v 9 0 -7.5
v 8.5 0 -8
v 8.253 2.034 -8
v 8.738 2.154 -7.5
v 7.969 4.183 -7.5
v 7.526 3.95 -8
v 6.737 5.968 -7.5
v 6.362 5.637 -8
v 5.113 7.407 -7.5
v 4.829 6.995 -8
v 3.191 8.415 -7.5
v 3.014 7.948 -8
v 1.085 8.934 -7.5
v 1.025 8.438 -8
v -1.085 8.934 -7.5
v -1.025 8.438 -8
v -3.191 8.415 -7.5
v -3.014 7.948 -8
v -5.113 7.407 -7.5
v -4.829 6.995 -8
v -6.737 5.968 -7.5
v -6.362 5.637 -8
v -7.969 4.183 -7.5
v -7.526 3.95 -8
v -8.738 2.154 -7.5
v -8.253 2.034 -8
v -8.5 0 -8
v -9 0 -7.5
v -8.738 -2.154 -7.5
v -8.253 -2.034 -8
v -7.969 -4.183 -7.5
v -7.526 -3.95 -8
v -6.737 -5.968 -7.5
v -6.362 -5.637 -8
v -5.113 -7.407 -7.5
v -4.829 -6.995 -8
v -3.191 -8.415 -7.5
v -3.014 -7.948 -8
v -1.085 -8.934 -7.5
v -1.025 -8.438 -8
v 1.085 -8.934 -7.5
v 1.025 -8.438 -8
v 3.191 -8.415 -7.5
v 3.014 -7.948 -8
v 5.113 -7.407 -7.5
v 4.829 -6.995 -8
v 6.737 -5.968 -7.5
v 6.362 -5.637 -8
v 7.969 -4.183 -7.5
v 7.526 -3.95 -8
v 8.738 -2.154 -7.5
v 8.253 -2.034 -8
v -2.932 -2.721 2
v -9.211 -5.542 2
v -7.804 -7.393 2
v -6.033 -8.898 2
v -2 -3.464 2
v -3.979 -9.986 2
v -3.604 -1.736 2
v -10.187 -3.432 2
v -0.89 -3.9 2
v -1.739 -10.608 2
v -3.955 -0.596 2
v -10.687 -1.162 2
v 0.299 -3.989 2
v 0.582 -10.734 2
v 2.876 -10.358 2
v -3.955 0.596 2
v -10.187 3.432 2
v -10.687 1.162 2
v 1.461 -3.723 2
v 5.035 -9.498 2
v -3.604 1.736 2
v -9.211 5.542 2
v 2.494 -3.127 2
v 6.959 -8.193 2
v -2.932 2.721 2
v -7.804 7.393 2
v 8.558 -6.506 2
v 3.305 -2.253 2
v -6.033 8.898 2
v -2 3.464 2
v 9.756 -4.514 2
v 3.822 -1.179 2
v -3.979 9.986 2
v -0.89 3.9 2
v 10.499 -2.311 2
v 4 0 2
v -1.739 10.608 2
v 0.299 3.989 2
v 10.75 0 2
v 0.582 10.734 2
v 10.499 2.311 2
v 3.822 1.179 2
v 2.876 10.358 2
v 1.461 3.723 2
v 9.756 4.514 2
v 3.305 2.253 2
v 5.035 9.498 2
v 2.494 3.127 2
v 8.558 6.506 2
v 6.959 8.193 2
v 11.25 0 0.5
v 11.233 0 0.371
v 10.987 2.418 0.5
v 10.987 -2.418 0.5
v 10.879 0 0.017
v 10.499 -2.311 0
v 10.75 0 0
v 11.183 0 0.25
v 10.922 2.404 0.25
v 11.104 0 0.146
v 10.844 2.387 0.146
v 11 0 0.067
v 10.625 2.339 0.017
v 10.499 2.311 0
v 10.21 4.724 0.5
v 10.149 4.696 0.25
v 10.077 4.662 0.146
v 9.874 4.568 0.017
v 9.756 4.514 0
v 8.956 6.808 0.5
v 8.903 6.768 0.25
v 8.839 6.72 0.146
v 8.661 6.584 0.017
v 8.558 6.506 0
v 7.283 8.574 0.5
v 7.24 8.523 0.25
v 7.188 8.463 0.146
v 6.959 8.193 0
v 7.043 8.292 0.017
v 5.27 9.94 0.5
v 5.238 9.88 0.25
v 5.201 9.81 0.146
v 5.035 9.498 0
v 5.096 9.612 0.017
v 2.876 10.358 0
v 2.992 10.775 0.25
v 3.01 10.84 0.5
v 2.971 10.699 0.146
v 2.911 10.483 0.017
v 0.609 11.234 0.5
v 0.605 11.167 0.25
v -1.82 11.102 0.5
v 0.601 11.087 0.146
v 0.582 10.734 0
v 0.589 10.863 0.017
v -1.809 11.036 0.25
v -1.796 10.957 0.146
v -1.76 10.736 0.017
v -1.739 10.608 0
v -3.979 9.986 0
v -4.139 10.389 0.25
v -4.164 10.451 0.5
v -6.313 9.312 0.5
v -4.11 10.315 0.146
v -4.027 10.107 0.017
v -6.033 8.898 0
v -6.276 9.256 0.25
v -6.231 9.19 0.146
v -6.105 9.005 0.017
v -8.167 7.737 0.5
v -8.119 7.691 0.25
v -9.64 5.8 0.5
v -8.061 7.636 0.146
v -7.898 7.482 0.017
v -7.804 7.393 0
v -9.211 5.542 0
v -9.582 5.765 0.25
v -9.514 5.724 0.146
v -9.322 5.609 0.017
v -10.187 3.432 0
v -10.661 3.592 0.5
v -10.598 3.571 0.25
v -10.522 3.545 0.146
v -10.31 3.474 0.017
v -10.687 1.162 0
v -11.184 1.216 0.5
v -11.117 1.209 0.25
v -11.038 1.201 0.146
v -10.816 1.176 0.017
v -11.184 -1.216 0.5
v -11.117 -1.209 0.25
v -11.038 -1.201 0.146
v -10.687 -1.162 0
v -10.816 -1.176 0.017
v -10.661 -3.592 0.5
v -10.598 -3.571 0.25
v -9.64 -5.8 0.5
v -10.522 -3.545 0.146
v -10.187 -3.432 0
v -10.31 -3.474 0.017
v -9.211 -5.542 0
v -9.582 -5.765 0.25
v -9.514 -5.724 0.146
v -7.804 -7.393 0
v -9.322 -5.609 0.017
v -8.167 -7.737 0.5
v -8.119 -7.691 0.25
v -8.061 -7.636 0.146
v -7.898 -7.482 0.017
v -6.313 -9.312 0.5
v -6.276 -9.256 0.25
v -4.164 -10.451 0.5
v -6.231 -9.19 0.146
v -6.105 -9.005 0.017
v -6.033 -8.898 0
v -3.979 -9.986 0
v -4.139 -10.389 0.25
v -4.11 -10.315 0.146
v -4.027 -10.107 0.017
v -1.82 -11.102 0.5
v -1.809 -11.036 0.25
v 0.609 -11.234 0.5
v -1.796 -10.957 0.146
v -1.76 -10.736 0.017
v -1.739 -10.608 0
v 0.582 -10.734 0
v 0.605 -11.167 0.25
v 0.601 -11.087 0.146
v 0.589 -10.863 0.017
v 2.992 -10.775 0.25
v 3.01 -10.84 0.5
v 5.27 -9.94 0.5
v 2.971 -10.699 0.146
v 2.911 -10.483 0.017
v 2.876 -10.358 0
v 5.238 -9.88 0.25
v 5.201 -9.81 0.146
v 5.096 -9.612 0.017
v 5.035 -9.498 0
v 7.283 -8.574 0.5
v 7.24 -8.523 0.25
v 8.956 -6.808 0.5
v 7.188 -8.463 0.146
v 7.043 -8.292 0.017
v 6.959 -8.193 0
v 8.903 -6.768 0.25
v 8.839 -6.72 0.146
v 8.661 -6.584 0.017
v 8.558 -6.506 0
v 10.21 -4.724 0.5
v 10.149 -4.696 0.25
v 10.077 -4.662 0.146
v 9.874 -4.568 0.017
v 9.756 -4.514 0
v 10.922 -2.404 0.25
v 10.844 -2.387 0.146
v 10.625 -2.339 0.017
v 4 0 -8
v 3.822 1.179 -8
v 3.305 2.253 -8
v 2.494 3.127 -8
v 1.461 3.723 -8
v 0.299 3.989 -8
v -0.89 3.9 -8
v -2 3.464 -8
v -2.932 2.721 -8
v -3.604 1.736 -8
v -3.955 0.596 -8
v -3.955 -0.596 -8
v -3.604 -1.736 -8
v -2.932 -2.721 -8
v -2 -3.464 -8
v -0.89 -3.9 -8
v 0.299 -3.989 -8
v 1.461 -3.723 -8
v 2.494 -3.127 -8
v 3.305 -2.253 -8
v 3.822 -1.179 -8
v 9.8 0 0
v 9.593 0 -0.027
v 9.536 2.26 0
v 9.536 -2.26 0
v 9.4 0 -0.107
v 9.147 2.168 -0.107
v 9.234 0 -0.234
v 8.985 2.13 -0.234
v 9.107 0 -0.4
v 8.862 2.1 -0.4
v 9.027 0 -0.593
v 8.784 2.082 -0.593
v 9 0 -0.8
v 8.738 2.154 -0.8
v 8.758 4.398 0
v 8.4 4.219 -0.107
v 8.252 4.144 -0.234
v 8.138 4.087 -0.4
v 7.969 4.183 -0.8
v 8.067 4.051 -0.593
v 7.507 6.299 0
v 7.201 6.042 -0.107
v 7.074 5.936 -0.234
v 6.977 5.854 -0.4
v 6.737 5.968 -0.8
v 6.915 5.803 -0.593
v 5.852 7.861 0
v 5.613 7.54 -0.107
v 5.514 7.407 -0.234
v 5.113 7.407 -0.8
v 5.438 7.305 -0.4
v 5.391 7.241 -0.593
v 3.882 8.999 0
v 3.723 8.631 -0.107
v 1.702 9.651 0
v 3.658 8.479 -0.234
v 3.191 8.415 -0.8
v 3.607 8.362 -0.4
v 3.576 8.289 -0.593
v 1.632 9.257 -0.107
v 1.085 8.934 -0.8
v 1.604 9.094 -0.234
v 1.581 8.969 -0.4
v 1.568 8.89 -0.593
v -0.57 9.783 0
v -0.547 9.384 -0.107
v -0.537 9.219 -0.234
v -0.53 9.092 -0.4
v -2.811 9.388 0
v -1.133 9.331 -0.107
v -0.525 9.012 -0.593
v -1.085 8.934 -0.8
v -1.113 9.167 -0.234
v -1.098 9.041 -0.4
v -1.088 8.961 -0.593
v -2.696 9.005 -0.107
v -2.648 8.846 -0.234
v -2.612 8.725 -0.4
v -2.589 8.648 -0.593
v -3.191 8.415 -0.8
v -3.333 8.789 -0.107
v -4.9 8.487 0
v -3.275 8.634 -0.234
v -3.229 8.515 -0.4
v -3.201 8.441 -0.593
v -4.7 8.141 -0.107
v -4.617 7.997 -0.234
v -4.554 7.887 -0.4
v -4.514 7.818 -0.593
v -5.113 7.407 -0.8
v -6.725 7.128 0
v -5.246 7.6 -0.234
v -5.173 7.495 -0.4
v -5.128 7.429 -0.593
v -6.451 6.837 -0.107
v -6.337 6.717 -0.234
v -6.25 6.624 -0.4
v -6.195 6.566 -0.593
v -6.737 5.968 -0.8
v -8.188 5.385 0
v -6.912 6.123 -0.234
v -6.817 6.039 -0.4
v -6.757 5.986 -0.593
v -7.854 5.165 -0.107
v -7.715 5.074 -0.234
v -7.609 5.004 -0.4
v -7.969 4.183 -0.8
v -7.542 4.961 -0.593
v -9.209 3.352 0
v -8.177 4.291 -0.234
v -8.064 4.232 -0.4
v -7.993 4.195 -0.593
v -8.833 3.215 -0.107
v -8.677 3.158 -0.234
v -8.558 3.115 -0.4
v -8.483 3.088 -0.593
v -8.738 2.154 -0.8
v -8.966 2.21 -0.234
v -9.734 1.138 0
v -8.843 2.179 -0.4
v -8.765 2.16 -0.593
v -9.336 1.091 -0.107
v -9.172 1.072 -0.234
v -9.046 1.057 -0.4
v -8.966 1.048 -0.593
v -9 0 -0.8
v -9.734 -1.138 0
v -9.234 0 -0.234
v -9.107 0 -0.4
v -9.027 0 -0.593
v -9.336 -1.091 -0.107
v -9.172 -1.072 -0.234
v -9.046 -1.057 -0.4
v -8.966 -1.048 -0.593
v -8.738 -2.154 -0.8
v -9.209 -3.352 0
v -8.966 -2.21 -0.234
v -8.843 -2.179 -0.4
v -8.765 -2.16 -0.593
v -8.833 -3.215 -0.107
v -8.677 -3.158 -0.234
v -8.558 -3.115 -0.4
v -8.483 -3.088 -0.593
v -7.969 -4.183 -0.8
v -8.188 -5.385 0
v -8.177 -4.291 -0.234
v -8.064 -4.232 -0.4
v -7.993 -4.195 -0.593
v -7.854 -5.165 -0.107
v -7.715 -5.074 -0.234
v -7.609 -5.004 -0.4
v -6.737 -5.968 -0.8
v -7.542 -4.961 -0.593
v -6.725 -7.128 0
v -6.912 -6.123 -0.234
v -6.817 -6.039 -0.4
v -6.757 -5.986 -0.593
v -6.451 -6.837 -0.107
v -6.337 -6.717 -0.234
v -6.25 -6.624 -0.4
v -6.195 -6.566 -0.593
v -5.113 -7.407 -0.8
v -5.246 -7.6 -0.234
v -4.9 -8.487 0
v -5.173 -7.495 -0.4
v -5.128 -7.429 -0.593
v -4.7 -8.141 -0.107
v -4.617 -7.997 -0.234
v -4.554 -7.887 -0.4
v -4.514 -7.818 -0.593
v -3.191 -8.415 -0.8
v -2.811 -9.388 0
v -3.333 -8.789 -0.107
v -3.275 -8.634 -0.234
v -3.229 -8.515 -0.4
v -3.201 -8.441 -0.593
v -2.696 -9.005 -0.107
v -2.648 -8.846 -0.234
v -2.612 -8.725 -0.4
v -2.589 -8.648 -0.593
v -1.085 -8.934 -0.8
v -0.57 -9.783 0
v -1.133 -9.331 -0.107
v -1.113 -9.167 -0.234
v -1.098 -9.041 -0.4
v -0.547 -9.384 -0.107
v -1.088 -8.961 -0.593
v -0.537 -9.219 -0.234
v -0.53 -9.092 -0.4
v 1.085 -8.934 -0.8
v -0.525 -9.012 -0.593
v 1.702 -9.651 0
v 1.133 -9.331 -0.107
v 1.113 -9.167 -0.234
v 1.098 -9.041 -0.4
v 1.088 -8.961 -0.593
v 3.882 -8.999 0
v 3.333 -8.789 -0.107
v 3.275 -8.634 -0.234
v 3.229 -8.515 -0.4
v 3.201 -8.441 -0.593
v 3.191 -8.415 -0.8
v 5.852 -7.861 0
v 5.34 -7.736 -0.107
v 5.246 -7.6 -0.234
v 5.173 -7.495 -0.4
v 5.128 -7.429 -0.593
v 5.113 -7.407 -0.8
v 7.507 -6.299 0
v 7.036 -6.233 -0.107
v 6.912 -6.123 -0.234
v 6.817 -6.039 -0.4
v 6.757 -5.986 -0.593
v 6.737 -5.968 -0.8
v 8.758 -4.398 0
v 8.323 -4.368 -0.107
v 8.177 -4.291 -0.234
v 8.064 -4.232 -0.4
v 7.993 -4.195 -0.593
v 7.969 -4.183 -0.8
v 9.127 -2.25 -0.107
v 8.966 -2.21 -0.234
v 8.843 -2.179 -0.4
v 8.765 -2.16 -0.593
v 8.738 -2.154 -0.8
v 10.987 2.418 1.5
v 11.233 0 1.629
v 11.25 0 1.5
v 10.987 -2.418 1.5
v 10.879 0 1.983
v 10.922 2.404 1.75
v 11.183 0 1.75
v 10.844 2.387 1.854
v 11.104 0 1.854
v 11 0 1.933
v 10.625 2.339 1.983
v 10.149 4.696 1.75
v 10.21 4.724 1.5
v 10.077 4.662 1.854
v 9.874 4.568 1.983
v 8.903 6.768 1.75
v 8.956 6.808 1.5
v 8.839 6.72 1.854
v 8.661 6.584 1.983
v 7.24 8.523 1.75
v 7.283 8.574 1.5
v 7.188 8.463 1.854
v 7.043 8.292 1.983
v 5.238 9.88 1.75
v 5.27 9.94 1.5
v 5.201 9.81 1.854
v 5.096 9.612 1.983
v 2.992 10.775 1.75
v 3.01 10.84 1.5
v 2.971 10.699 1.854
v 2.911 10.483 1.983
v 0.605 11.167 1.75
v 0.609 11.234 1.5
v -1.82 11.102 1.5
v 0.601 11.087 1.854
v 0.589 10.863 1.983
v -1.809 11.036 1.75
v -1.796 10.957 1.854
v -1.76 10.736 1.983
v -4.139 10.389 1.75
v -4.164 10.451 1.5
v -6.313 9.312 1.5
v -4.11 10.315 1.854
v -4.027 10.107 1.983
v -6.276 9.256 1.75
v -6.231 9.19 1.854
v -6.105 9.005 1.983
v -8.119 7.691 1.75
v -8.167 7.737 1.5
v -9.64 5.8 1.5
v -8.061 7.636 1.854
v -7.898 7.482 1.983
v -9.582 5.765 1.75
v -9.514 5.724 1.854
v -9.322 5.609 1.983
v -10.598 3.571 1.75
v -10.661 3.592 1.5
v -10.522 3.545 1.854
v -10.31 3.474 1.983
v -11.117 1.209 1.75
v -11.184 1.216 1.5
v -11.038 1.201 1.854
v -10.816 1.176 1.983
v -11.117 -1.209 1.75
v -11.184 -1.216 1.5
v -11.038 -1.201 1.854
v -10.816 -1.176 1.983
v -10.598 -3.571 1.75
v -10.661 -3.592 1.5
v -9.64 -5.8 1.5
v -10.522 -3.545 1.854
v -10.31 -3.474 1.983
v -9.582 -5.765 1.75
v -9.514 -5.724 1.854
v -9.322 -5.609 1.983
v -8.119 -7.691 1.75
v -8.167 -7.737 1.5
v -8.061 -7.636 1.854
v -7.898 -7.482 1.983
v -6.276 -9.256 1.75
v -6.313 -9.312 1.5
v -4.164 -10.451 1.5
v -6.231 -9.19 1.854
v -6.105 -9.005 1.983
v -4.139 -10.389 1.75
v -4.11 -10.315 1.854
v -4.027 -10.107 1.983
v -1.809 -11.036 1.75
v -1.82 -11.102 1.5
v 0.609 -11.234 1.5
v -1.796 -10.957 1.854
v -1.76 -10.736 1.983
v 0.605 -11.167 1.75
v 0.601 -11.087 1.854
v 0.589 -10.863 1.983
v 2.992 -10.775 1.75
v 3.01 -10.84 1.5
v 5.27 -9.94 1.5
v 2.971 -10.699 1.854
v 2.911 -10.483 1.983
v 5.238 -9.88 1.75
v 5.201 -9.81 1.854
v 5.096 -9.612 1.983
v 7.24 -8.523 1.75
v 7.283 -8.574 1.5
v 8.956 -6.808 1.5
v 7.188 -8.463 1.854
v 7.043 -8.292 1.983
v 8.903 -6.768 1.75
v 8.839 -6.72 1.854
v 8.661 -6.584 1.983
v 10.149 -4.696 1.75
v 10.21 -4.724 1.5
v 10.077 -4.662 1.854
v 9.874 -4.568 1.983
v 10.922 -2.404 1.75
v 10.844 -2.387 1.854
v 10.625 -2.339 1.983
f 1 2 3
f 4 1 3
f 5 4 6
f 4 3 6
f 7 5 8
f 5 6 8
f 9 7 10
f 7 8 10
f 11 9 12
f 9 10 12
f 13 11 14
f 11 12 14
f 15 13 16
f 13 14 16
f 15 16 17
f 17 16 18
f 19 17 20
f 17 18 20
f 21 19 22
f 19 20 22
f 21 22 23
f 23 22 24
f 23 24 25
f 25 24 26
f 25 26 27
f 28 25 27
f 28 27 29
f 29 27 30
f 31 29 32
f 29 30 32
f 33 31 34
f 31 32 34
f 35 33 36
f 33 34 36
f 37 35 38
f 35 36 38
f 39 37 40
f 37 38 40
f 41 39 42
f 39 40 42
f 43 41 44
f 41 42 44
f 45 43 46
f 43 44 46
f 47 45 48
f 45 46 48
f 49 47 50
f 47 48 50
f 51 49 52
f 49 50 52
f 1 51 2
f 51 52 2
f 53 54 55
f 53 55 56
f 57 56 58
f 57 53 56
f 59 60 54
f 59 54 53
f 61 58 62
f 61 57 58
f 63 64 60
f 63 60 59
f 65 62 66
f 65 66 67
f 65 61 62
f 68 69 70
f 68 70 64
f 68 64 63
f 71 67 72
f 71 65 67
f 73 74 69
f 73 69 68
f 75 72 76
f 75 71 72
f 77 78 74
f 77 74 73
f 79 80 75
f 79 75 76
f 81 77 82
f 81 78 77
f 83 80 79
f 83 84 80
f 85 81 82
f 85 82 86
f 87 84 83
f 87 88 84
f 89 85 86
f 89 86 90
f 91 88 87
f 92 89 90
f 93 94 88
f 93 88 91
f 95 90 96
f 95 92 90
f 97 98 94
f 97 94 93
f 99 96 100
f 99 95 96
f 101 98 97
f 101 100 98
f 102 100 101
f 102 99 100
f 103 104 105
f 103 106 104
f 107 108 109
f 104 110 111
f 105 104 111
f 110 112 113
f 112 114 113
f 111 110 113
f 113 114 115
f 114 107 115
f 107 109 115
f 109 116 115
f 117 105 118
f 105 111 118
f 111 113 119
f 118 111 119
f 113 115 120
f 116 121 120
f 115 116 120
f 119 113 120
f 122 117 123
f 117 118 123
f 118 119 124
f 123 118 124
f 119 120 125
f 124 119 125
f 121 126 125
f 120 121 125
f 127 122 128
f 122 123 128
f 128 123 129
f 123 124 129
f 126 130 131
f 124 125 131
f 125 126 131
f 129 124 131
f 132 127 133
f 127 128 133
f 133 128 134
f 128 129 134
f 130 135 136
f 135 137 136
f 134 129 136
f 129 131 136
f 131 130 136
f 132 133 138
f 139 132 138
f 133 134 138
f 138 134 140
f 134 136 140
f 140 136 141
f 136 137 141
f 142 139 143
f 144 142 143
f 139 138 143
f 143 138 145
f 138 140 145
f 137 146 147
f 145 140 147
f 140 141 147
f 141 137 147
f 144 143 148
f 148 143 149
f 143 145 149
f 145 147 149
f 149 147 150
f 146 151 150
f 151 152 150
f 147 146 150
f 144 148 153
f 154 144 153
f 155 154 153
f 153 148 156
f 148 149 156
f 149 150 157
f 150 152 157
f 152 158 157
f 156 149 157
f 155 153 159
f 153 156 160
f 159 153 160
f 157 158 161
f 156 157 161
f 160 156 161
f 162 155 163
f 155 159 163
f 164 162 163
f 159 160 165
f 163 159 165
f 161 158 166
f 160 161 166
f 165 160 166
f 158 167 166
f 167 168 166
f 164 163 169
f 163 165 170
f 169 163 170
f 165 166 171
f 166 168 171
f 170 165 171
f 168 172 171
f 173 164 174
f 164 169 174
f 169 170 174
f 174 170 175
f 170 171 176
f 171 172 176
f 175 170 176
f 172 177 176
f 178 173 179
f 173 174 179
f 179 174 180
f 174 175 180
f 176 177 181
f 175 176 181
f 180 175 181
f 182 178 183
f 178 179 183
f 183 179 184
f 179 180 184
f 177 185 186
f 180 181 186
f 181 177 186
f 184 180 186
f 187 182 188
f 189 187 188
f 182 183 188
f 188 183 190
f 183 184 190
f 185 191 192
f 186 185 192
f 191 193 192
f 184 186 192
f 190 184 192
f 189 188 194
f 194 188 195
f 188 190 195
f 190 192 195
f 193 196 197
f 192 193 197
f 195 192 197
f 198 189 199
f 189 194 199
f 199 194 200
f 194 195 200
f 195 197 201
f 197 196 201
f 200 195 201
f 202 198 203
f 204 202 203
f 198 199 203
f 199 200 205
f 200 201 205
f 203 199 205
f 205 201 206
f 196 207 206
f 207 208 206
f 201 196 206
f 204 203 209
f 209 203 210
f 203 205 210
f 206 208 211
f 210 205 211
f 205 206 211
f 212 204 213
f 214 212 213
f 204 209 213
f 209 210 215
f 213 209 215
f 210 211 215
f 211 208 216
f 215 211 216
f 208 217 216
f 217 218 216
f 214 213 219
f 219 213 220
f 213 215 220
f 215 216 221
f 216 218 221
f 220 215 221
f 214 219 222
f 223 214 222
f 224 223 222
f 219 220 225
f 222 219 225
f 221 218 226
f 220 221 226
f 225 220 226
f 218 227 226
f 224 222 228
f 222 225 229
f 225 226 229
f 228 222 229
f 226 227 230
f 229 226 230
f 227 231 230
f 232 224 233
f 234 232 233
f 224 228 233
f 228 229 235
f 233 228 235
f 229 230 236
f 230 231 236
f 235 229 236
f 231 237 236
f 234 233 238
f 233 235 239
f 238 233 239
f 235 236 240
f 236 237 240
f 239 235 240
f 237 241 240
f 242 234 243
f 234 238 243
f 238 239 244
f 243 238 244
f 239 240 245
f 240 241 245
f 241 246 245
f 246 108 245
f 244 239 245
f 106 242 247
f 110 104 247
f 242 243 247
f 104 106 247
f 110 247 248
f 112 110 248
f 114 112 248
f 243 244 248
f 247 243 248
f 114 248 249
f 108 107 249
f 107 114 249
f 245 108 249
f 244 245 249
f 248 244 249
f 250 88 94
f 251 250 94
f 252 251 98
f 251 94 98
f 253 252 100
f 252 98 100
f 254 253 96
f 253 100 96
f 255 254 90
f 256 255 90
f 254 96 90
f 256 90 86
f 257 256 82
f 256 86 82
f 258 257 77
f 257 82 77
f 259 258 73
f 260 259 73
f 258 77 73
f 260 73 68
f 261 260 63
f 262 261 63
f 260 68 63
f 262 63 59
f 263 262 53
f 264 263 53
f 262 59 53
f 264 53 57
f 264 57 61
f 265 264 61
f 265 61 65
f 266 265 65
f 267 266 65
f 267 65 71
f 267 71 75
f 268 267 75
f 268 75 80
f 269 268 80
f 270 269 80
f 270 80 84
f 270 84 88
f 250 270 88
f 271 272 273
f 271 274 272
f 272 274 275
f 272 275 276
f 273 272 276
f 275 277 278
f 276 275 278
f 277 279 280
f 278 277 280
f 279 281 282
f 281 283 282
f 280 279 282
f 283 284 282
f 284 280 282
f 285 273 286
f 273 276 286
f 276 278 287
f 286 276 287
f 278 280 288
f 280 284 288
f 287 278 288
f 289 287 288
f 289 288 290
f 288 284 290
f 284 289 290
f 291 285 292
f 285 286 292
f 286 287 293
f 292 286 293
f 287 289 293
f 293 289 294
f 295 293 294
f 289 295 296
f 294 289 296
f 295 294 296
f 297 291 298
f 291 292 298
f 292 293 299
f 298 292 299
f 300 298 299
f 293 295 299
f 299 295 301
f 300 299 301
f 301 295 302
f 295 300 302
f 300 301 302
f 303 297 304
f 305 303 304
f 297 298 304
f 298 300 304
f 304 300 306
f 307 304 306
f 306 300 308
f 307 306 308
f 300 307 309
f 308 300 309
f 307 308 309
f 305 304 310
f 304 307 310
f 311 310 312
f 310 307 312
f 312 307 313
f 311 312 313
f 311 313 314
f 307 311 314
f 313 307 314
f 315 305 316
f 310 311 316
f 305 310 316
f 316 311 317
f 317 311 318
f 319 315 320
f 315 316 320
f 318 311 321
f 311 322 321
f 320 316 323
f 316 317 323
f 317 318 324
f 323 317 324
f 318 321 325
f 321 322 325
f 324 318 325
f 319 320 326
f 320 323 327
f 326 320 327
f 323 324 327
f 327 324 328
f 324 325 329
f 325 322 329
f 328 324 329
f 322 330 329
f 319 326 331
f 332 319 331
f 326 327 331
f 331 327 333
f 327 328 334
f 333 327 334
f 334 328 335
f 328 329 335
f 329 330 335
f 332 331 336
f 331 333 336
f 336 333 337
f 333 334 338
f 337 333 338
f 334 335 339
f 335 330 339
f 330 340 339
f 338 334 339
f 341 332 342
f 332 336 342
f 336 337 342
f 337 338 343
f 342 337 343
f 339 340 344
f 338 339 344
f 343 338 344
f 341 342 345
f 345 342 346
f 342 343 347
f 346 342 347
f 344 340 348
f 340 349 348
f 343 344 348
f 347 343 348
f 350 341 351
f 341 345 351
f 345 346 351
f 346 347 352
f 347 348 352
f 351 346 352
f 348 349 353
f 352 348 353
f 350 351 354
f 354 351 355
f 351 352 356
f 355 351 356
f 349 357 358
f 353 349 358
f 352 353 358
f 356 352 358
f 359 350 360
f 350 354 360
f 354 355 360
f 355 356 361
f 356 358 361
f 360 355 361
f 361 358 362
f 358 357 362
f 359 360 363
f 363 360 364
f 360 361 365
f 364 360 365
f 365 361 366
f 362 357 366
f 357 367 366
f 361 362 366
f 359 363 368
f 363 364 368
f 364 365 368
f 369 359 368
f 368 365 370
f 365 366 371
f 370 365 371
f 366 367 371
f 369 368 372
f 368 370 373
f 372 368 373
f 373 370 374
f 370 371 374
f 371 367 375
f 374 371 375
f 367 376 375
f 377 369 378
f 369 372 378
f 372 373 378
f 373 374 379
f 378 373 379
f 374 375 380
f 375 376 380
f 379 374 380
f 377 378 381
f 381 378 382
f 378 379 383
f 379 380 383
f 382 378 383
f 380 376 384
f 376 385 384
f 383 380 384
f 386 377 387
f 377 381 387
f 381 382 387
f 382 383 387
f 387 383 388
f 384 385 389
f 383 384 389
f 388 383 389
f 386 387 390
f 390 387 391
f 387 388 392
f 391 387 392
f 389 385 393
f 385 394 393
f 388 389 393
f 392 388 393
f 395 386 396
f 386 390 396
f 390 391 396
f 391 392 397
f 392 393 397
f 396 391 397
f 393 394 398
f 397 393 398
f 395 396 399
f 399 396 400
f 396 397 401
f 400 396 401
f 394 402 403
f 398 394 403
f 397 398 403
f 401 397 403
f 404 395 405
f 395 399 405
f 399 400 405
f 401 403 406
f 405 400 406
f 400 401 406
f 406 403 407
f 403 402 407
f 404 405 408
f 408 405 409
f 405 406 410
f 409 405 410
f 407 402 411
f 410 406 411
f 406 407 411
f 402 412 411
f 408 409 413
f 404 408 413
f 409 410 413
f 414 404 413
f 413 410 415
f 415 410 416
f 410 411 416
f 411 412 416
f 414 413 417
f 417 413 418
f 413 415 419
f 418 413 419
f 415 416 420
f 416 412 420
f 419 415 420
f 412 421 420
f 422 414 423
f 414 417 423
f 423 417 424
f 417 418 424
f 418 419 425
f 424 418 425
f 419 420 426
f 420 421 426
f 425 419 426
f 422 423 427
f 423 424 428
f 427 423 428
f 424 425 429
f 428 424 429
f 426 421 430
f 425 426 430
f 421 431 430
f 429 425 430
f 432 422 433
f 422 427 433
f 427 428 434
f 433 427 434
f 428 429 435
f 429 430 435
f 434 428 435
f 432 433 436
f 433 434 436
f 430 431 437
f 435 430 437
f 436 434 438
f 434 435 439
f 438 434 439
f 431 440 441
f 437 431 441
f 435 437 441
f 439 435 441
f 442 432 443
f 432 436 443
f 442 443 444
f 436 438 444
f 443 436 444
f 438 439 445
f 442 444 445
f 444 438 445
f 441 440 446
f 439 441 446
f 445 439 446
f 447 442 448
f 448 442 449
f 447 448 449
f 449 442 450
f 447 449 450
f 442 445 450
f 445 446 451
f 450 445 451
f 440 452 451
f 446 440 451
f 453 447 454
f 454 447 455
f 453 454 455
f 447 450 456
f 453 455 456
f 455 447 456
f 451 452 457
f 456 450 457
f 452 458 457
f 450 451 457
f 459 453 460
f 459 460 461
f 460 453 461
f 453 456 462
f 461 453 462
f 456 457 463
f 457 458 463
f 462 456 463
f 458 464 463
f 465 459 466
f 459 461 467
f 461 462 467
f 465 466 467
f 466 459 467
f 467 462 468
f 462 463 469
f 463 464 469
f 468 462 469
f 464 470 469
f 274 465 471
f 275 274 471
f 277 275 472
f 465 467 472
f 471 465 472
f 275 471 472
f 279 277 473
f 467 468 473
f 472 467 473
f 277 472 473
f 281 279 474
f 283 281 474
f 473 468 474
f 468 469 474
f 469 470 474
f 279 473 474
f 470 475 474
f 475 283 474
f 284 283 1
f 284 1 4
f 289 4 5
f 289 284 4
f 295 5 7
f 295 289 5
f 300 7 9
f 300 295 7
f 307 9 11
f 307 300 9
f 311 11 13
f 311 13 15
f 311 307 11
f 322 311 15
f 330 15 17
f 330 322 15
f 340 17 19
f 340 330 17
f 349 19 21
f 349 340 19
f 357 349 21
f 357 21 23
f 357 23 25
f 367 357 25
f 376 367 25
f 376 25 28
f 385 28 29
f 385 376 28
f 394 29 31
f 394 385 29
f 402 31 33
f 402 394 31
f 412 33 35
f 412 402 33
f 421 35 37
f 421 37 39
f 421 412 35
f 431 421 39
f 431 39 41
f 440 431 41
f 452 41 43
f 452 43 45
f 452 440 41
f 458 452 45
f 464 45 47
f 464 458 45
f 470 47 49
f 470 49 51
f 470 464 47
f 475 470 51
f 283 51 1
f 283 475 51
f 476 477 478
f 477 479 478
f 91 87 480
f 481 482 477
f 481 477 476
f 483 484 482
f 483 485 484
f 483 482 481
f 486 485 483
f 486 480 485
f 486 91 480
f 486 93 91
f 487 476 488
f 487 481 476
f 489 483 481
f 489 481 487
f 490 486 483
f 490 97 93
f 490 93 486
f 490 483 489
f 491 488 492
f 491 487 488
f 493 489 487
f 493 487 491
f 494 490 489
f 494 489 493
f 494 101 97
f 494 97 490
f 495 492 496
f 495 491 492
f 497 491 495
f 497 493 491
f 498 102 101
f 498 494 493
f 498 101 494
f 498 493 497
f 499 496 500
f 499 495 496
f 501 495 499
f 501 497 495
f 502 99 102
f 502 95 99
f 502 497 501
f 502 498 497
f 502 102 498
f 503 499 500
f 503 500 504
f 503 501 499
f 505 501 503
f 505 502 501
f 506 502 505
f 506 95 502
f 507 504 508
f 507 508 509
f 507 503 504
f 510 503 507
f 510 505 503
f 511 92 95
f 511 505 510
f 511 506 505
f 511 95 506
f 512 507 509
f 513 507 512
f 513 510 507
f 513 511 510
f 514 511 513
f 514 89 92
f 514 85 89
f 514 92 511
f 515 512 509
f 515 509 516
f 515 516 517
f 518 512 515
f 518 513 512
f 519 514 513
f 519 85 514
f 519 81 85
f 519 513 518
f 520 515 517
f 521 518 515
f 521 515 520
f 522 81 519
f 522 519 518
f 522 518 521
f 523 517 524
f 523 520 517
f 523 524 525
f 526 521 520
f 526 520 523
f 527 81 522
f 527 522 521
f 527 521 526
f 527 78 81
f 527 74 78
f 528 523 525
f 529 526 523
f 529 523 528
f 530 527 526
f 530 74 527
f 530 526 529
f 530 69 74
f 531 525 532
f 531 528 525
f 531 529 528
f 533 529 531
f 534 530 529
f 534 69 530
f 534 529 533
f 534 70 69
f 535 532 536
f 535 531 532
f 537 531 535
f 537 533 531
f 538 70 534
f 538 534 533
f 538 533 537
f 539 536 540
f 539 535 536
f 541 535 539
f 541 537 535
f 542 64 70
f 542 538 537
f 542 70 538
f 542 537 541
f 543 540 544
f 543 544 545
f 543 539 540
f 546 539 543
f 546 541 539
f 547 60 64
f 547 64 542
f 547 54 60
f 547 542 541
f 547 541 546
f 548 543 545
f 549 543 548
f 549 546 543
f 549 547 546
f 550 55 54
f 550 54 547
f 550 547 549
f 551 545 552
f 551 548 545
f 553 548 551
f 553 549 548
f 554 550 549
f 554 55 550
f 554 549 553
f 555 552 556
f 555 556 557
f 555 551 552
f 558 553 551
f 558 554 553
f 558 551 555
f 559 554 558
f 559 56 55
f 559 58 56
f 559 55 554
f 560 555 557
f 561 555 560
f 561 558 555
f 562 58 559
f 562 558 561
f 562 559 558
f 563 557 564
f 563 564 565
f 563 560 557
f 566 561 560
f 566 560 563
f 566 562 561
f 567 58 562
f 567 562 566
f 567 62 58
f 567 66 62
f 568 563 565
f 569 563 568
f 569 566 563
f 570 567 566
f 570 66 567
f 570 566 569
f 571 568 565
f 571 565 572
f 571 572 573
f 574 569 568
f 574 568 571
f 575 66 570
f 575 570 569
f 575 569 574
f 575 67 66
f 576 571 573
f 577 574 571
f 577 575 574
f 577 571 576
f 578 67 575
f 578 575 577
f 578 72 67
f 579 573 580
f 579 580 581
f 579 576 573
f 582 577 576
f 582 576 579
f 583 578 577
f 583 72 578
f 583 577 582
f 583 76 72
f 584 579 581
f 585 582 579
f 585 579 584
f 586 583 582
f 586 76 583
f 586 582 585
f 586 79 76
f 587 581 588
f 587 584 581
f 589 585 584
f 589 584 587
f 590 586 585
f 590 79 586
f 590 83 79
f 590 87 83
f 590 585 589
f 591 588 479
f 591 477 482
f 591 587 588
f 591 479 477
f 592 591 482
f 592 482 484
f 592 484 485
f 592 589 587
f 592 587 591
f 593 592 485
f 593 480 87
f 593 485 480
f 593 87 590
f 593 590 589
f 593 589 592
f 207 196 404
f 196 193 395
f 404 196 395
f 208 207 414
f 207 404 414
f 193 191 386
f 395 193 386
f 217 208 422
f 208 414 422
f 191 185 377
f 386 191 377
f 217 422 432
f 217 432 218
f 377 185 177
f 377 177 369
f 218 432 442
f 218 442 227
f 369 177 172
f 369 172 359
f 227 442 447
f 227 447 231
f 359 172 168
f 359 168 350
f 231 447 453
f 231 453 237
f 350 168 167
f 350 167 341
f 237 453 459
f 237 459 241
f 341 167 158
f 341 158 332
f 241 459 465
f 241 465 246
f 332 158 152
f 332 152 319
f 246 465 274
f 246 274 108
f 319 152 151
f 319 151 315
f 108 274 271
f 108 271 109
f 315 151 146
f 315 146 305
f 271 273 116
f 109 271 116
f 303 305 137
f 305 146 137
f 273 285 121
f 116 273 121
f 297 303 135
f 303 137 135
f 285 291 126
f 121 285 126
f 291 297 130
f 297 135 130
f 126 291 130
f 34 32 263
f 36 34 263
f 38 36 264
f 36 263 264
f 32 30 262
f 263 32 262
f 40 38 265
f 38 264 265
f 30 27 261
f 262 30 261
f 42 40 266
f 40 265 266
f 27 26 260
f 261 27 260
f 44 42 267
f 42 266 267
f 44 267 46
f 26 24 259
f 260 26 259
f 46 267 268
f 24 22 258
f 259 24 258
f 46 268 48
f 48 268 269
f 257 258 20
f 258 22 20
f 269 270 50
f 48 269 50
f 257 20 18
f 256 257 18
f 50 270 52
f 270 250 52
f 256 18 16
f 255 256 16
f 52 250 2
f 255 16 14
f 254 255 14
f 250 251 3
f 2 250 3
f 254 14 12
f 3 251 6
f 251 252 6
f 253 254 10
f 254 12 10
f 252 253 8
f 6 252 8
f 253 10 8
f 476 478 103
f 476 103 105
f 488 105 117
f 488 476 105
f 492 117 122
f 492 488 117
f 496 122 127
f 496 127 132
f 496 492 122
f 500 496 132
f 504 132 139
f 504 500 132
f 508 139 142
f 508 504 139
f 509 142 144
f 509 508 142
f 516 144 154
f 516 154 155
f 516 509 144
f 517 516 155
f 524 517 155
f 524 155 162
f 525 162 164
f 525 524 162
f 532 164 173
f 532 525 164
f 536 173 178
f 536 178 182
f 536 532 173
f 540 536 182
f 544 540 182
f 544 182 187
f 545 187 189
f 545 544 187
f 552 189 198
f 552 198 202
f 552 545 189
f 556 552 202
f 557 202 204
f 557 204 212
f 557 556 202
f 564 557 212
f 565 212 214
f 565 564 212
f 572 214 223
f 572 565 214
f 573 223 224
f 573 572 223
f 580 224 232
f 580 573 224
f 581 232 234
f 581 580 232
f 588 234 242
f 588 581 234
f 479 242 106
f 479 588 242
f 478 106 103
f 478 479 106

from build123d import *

# Parameters (mm, degrees)
SKETCH1_R           = 9
SKETCH1_R_2         = 4
BOSS_EXTRUDE1_DEPTH = 8
BOSS_EXTRUDE2_START = 2
SKETCH2_R           = 11.25
SKETCH2_R_2         = 4
BOSS_EXTRUDE2_DEPTH = 2
FILLET1_R           = 0.5
FILLET2_R           = 0.5
FILLET3_R           = 0.8
CHAMFER1_SIZE       = 0.5


with BuildPart() as part:
    # Sketch1 → Boss-Extrude1 (new body)
    with BuildSketch(Plane.XY):
        Circle(SKETCH1_R)
        Circle(SKETCH1_R_2, mode=Mode.SUBTRACT)
    extrude(amount=-BOSS_EXTRUDE1_DEPTH)

    # Sketch2 → Boss-Extrude2 (add)
    with BuildSketch(Plane.XY.offset(BOSS_EXTRUDE2_START)):
        Circle(SKETCH2_R)
        Circle(SKETCH2_R_2, mode=Mode.SUBTRACT)
    extrude(amount=-BOSS_EXTRUDE2_DEPTH)

    # Fillet1
    fillet1_edges = [part.edges().sort_by_distance(p)[0] for p in [
        (-11.25, 0, 2),
    ]]
    fillet(fillet1_edges, radius=FILLET1_R)

    # Fillet2
    fillet2_edges = [part.edges().sort_by_distance(p)[0] for p in [
        (-11.25, 0, 0),
    ]]
    fillet(fillet2_edges, radius=FILLET2_R)

    # Fillet3
    fillet3_edges = [part.edges().sort_by_distance(p)[0] for p in [
        (-9, 0, 0),
    ]]
    fillet(fillet3_edges, radius=FILLET3_R)

    # Chamfer1
    chamfer1_edges = [part.edges().sort_by_distance(p)[0] for p in [
        (-9, 0, -8),
    ]]
    chamfer(chamfer1_edges, length=CHAMFER1_SIZE)


solid = part.part
